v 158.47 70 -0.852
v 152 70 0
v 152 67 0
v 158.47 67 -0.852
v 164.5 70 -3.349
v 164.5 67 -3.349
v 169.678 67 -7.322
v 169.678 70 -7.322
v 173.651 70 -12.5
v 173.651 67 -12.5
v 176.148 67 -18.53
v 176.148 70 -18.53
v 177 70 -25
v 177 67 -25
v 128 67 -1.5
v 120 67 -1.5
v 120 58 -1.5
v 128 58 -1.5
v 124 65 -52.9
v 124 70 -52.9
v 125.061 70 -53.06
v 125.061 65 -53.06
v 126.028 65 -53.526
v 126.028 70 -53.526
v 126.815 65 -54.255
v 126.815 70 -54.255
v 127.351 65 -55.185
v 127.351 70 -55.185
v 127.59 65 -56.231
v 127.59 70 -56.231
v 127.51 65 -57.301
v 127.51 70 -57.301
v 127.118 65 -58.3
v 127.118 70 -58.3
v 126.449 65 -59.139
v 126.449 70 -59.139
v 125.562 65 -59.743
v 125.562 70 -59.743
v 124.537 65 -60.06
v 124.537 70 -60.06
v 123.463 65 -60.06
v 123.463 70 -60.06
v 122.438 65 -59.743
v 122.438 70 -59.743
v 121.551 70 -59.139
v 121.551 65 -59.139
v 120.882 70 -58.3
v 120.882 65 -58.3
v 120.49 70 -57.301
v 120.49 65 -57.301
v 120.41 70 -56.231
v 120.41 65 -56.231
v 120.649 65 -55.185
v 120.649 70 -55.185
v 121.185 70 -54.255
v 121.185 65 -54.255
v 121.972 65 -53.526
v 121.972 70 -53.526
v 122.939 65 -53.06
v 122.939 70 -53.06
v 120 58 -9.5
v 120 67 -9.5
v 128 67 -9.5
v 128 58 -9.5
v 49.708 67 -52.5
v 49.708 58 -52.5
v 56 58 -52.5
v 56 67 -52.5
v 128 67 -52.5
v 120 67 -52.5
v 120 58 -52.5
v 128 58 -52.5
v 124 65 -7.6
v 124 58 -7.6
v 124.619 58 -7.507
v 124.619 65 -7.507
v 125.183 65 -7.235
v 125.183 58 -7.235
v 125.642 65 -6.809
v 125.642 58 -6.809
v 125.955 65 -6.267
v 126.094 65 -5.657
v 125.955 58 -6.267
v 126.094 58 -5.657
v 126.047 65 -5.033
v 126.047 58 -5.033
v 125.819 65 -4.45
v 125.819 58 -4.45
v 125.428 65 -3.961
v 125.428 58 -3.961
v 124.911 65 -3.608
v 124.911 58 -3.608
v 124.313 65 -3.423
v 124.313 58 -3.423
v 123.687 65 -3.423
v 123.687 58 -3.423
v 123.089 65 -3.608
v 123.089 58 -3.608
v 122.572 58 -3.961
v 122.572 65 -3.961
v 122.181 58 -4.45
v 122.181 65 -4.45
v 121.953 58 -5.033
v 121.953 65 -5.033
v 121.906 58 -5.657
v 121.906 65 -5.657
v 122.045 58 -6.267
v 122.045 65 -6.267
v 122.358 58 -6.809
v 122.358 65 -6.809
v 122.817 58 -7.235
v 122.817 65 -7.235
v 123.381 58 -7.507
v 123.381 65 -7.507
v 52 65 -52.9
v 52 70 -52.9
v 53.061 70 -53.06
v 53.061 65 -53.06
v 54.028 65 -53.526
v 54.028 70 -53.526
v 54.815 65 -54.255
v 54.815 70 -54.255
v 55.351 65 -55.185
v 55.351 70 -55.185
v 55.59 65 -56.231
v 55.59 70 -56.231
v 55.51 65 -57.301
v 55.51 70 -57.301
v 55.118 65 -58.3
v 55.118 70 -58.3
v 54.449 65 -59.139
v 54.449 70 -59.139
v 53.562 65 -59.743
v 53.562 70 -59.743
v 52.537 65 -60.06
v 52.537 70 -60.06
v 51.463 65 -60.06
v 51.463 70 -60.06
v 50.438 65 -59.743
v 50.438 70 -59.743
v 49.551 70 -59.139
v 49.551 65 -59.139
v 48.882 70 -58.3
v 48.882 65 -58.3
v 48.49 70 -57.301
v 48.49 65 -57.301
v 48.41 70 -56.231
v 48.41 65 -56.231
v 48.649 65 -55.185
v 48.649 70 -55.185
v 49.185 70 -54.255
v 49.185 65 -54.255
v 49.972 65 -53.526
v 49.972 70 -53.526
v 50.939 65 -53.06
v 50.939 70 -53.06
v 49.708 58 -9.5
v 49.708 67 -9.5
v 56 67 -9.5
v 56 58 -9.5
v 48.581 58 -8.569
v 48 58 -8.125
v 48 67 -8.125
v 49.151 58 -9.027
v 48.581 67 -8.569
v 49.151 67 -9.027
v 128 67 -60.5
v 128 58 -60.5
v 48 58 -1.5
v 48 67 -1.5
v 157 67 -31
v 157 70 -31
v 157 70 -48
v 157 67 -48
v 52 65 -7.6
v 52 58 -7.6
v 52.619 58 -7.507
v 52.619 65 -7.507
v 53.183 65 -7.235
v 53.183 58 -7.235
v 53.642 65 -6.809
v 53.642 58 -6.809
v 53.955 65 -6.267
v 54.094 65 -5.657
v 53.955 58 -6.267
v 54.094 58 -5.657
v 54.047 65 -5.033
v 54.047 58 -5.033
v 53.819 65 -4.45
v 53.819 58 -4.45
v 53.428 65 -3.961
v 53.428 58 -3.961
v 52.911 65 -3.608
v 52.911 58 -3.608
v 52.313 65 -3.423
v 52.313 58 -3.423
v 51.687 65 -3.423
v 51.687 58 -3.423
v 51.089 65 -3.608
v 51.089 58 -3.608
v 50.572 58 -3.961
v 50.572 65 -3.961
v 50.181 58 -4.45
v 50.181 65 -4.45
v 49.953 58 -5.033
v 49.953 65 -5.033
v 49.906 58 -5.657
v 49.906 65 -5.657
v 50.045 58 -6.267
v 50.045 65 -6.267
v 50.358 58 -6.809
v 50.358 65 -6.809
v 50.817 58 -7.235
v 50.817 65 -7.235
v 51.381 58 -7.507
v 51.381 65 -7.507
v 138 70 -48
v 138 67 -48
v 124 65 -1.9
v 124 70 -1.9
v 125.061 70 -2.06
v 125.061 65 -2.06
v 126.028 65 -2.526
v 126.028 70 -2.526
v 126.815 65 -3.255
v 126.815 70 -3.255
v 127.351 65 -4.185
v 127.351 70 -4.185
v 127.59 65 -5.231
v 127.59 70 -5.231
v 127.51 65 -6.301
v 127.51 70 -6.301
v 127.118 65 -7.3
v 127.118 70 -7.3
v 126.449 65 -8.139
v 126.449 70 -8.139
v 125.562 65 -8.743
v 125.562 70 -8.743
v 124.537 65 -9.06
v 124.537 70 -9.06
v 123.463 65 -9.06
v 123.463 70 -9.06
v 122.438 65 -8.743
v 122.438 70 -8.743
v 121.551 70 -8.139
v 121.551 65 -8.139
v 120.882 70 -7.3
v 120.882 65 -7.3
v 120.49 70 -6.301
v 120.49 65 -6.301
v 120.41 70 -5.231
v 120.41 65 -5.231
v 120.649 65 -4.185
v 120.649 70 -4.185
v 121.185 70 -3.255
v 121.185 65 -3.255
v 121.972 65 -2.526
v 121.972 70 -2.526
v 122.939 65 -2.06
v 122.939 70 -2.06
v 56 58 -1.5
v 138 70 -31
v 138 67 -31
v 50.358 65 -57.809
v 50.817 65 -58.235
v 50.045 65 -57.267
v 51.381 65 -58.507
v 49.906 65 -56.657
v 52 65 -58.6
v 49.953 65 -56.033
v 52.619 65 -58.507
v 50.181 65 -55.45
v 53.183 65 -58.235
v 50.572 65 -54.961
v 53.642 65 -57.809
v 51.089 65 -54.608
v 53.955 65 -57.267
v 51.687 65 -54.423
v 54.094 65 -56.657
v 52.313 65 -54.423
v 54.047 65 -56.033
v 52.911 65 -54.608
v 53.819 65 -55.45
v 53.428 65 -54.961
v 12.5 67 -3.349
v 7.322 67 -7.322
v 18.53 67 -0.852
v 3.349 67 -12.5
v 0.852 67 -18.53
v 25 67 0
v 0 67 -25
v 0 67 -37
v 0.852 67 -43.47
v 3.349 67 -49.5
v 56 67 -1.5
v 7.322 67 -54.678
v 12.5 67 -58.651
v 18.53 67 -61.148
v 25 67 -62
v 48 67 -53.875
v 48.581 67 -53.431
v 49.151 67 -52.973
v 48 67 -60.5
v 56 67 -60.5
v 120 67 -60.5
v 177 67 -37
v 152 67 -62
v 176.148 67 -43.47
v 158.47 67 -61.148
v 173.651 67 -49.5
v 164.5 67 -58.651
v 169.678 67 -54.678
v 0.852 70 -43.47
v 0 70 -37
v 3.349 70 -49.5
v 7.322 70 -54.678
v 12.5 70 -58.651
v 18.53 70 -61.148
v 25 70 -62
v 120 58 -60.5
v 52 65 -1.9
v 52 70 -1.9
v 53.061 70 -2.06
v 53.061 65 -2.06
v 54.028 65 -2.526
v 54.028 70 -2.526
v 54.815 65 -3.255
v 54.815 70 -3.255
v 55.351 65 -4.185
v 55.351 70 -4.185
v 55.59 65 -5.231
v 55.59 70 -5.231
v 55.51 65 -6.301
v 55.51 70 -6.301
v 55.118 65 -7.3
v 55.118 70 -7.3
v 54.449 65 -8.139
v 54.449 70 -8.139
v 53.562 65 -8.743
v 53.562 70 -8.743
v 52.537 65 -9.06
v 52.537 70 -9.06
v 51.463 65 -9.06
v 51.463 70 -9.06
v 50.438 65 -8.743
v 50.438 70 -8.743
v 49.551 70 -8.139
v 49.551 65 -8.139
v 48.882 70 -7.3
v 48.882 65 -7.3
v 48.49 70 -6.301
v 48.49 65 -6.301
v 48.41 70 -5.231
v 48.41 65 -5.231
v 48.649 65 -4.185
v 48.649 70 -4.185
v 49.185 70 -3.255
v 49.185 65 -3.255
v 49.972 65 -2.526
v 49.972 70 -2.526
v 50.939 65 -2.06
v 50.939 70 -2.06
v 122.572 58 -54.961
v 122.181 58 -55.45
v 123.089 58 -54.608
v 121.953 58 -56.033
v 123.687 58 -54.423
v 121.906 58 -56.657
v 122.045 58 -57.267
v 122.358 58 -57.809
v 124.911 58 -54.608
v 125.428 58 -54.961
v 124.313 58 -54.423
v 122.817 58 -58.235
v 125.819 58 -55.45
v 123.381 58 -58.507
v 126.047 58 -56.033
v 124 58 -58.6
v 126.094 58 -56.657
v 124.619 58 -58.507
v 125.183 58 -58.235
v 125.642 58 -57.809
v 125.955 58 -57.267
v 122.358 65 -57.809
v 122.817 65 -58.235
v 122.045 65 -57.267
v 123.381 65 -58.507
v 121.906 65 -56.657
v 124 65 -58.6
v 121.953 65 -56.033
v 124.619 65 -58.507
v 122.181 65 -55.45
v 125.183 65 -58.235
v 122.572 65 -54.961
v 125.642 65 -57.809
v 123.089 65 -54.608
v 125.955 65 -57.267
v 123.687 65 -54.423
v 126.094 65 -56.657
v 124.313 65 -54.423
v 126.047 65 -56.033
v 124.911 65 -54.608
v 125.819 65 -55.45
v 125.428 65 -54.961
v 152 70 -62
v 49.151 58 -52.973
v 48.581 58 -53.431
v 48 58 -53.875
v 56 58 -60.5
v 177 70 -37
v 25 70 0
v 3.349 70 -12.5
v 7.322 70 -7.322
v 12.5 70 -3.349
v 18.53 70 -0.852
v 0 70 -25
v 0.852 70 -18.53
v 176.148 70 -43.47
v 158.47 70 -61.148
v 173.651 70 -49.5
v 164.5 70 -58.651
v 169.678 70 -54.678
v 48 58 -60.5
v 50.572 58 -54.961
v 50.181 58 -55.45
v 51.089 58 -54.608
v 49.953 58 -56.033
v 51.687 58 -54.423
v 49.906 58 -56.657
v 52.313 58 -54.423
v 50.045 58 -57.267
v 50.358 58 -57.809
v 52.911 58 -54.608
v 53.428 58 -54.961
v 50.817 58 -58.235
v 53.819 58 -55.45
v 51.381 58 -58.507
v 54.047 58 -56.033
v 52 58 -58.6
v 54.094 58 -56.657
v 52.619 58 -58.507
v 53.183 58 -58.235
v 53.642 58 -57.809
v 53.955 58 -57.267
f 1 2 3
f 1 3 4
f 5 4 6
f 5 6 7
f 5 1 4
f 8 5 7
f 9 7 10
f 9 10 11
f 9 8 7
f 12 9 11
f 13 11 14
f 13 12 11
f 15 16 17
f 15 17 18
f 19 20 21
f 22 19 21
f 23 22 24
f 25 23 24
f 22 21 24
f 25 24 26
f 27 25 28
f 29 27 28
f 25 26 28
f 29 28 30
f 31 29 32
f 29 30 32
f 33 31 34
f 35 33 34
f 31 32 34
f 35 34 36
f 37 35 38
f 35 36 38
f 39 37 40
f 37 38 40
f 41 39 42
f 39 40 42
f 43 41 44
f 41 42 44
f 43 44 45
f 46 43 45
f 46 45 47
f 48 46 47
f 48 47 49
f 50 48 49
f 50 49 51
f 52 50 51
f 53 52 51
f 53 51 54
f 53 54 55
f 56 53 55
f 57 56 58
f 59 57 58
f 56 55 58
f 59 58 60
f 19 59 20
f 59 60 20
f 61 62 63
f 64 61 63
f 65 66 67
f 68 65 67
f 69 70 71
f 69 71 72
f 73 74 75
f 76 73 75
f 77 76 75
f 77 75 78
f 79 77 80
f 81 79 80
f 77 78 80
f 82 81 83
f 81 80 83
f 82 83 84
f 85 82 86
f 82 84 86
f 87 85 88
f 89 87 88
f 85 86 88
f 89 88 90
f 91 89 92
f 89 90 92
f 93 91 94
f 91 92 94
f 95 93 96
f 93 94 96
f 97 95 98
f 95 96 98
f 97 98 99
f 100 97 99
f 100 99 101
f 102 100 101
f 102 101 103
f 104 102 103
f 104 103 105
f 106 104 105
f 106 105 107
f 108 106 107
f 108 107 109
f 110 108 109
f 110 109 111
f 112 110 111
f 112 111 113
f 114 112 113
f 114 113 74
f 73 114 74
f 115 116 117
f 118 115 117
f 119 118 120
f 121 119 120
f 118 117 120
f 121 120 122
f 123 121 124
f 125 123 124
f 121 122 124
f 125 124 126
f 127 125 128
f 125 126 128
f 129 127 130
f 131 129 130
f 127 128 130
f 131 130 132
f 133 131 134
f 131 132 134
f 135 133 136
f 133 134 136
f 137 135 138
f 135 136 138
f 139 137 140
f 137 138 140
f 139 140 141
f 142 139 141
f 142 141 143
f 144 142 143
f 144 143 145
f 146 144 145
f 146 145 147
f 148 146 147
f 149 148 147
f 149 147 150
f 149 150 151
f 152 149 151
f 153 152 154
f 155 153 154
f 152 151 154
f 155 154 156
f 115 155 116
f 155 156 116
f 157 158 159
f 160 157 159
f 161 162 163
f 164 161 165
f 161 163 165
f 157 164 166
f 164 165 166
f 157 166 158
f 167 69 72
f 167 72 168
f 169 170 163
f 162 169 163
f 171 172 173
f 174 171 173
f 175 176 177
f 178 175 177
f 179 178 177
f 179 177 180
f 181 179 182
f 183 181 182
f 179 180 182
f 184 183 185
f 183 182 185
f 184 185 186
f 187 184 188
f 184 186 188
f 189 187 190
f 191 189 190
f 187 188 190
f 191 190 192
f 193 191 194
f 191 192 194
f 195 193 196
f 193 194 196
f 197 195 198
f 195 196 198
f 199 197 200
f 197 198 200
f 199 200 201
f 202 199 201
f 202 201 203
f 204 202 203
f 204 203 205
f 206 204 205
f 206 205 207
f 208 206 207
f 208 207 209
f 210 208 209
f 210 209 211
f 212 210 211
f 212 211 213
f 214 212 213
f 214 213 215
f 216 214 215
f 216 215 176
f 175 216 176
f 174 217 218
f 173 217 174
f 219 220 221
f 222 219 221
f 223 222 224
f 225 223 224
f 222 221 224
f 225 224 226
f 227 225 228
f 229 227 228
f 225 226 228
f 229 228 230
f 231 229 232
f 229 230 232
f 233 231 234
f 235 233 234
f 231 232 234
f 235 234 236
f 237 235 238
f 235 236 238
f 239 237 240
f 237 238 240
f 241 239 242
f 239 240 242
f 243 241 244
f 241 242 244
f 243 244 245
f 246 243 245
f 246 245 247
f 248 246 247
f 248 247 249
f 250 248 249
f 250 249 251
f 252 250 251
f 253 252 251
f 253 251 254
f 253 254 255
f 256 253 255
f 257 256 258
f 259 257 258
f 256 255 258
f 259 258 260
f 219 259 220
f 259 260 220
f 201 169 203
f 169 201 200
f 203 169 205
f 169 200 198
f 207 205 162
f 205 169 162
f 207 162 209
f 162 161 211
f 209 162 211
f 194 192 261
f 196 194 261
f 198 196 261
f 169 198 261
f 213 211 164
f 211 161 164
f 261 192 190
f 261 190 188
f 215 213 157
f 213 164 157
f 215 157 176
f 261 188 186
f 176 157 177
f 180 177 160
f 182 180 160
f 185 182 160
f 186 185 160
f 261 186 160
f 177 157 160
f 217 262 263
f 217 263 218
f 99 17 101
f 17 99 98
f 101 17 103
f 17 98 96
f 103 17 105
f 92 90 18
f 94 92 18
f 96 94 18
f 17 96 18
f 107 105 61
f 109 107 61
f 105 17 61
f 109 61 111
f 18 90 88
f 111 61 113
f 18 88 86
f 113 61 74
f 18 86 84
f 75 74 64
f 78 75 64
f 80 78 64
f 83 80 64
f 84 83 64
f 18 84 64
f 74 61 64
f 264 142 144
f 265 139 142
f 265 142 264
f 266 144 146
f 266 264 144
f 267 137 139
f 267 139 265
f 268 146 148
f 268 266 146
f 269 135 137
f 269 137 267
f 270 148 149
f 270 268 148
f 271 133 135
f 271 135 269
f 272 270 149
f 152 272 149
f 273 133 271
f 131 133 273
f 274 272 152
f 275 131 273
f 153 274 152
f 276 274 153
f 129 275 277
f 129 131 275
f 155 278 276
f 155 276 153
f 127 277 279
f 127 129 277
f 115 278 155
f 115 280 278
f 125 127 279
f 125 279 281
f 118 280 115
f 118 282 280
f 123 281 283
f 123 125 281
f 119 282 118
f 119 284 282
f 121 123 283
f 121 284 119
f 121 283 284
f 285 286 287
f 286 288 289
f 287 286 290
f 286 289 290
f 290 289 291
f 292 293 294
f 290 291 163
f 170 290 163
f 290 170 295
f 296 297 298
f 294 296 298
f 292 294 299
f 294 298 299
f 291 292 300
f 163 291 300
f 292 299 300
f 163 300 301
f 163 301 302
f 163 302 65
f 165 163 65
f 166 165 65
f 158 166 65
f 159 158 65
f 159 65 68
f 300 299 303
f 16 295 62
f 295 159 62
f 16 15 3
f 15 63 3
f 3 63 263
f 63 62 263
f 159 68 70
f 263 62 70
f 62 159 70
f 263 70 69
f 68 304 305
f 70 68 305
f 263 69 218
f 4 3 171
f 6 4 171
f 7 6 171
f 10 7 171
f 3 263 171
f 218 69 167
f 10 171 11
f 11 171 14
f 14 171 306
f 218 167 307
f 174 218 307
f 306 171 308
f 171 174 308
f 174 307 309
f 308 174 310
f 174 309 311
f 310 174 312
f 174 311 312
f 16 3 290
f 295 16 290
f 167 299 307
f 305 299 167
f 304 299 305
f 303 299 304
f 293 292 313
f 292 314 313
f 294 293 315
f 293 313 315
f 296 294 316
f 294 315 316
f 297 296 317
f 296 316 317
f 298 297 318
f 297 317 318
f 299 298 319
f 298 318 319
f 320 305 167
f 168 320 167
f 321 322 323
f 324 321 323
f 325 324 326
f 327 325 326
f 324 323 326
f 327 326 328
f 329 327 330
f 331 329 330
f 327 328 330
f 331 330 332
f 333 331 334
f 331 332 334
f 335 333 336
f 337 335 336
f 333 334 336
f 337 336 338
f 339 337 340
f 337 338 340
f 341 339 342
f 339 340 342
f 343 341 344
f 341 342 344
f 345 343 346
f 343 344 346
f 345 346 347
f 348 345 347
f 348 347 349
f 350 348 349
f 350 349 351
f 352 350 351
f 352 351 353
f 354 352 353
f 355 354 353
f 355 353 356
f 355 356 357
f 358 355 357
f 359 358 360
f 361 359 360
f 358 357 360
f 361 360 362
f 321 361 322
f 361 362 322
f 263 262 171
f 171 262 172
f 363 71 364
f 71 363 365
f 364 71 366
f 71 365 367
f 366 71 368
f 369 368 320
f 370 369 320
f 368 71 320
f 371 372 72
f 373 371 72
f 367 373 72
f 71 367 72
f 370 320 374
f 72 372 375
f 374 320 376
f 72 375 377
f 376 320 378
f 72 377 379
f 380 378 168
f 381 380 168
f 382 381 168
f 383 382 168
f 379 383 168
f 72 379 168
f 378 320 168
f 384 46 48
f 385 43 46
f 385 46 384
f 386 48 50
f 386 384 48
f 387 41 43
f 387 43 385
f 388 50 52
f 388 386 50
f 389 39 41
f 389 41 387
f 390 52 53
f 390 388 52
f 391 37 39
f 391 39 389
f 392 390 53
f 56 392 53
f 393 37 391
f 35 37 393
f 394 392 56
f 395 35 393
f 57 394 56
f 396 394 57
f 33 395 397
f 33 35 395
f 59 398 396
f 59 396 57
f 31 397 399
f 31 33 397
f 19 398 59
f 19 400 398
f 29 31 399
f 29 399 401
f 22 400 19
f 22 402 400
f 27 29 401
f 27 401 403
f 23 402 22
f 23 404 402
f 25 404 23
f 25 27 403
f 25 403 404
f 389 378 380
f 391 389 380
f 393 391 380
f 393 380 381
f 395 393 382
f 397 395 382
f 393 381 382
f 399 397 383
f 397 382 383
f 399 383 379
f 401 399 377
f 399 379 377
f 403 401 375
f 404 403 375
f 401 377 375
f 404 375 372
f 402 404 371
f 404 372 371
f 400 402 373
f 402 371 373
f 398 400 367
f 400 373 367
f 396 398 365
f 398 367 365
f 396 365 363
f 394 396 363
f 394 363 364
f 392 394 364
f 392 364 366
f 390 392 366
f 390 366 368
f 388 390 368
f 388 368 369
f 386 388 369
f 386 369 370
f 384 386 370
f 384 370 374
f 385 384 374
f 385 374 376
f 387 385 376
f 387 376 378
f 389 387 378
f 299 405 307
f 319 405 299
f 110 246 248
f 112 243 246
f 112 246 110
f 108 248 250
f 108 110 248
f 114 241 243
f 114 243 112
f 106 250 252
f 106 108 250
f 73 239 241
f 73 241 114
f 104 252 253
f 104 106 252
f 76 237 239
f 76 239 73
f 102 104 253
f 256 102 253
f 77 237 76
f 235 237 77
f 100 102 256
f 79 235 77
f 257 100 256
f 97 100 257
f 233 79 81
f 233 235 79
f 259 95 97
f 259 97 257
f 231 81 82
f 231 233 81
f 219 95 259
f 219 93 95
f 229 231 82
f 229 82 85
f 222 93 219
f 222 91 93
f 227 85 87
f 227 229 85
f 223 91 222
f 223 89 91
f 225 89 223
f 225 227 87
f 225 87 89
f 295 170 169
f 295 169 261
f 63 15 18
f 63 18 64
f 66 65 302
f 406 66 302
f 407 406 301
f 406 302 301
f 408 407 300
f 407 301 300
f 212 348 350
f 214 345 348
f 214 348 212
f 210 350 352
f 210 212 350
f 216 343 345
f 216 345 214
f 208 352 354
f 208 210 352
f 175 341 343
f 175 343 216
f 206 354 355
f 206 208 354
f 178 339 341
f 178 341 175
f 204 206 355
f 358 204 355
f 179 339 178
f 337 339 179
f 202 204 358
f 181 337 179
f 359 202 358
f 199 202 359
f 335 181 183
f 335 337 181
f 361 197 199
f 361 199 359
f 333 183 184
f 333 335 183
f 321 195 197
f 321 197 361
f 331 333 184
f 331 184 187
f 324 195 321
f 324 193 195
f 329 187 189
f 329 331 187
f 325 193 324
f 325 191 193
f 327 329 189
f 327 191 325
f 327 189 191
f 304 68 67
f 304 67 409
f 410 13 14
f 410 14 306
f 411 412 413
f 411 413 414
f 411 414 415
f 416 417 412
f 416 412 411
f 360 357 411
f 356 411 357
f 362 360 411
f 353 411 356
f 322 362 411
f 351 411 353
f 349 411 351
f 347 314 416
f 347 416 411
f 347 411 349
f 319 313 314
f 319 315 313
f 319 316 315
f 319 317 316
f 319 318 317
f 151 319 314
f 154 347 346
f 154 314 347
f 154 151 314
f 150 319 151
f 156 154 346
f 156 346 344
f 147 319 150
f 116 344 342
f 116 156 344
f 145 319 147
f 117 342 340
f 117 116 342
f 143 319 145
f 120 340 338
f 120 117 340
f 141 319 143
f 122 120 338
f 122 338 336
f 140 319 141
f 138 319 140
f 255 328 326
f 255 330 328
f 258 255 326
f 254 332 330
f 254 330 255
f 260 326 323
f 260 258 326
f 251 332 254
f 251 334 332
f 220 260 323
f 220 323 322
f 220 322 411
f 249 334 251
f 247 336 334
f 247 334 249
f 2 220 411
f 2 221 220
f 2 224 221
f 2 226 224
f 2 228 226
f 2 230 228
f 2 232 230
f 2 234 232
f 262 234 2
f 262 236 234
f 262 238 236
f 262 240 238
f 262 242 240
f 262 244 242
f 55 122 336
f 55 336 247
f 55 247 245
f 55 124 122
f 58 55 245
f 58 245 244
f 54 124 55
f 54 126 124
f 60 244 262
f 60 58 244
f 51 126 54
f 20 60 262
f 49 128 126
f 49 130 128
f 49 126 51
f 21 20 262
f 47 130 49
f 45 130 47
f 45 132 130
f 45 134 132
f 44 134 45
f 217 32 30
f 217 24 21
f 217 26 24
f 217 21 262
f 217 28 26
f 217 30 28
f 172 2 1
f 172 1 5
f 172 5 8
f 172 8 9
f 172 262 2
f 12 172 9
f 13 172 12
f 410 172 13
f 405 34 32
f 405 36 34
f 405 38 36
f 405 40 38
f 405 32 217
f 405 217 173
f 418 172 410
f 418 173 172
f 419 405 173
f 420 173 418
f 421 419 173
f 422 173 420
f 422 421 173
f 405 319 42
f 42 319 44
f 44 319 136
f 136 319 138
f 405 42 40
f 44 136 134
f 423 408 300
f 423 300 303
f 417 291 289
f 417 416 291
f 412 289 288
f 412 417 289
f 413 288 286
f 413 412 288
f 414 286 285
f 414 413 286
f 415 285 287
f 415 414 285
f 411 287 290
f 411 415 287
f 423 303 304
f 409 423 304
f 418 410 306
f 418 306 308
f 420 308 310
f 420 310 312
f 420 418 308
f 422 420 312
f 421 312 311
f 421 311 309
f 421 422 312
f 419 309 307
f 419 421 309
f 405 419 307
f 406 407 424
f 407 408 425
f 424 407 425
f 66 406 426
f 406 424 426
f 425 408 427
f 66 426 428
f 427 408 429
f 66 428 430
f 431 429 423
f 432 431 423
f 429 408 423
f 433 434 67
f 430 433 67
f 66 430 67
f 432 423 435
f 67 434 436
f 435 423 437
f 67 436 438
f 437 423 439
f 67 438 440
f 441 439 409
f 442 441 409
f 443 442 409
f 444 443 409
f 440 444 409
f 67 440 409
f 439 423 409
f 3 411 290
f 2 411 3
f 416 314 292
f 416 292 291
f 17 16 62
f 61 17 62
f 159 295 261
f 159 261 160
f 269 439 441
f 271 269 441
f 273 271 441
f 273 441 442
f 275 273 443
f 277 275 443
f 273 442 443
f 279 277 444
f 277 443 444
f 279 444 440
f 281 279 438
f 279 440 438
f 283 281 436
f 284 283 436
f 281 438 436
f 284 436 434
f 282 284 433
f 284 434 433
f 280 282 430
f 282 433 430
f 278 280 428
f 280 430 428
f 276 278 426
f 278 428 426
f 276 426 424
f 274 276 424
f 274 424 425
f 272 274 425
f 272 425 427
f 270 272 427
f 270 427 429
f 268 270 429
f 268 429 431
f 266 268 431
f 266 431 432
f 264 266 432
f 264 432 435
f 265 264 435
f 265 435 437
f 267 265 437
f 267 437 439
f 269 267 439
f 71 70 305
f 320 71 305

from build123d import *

# Parameters (mm, degrees)
SKETCH1_W                = 177
SKETCH1_H                = 62
BOSS_EXTRUDE1_DEPTH      = 70
FILLET1_R                = 25
SKETCH3_W                = 19
SKETCH3_H                = 17
CUT_EXTRUDE1_DEPTH       = 70
CUT_EXTRUDE5_DEPTH       = 64
BOSS_EXTRUDE7_DEPTH      = 33
SKETCH16_W               = 5
SKETCH16_H               = 5
BOSS_EXTRUDE8_DEPTH      = 40
SKETCH11_R               = 25
CUT_EXTRUDE9_DEPTH       = 5.5
SKETCH22_R               = 28.5
BOSS_EXTRUDE20_DEPTH     = 21
BOSS_EXTRUDE21_DEPTH     = 10
BOSS_EXTRUDE22_DEPTH     = 40
SKETCH26_R               = 25
SKETCH26_W               = 19
SKETCH26_H               = 17
BOSS_EXTRUDE23_DEPTH     = 1
SKETCH27_W               = 40
SKETCH27_H               = 10
CUT_EXTRUDE12_DEPTH      = 10
SKETCH28_W               = 10
SKETCH28_H               = 10
CUT_EXTRUDE13_DEPTH      = 5
SKETCH30_W               = 194.337314874
SKETCH30_H               = 68.122542634
CUT_EXTRUDE14_DEPTH      = 0.1
CUT_EXTRUDE17_DEPTH      = 58
CUT_EXTRUDE17_DEPTH_BACK = 45
SKETCH26_3_R             = 25
SKETCH26_3_W             = 19
SKETCH26_3_H             = 17
CUT_EXTRUDE25_START      = -21.9
CUT_EXTRUDE25_DEPTH      = 21.9
SKETCH38_W               = 8
SKETCH38_H               = 8
BOSS_EXTRUDE26_DEPTH     = 12
SKETCH41_R               = 3.6
CUT_EXTRUDE28_DEPTH      = 5
SKETCH44_R               = 2.1
CUT_EXTRUDE29_DEPTH      = 8
CUT_EXTRUDE30_START      = -3
SKETCH22_2_R             = 28.5
CUT_EXTRUDE30_DEPTH      = 40
SKETCH45_W               = 19.955287375
SKETCH45_H               = 24.166036088
CUT_EXTRUDE31_DEPTH      = 112


with BuildPart() as part:
    # Sketch1 → Boss-Extrude1 (new body)
    with BuildSketch(Plane(origin=(0, 0, 0), x_dir=(1, 0, 0), z_dir=(0, 1, 0))):
        with Locations((88.5, 31)):
            Rectangle(SKETCH1_W, SKETCH1_H)
    extrude(amount=BOSS_EXTRUDE1_DEPTH)

    # Fillet1
    fillet1_edges = [part.edges().sort_by_distance(p)[0] for p in [
        (0, 35, -62),
        (177, 35, -62),
        (177, 35, 0),
        (0, 35, 0),
    ]]
    fillet(fillet1_edges, radius=FILLET1_R)

    # Sketch3 → Cut-Extrude1 (cut)
    with BuildSketch(Plane(origin=(0, 70, 0), x_dir=(1, 0, 0), z_dir=(0, 1, 0))):
        with Locations((147.5, 39.5)):
            Rectangle(SKETCH3_W, SKETCH3_H)
    extrude(amount=-CUT_EXTRUDE1_DEPTH, mode=Mode.SUBTRACT)

    # Sketch9 → Cut-Extrude5 (cut)
    with BuildSketch(Plane(origin=(0, 67, 0), x_dir=(1, 0, 0), z_dir=(0, 1, 0))):
        with BuildLine():
            Line((25, 59), (152, 59))
            ThreePointArc((152, 59), (167.556349186, 52.556349186), (174, 37))
            Line((174, 37), (174, 25))
            ThreePointArc((174, 25), (167.556349186, 9.443650814), (152, 3))
            Line((152, 3), (25, 3))
            ThreePointArc((25, 3), (9.443650814, 9.443650814), (3, 25))
            Line((3, 25), (3, 37))
            ThreePointArc((3, 37), (9.443650814, 52.556349186), (25, 59))
        make_face()
    extrude(amount=-CUT_EXTRUDE5_DEPTH, mode=Mode.SUBTRACT)

    # Sketch15 → Boss-Extrude7 (add)
    with BuildSketch(Plane.XZ):
        Polygon((125, -7), (121, -3), (119, -3), (119, -7.5), (125, -7.5), align=None)
        Polygon((137, -7), (137, -7.5), (143, -7.5), (143, -3), (141, -3), align=None)
    extrude(amount=-BOSS_EXTRUDE7_DEPTH)

    # Sketch16 → Boss-Extrude8 (add)
    with BuildSketch(Plane.XZ):
        with Locations((58.5, -5.5)):
            Rectangle(SKETCH16_W, SKETCH16_H)
        Polygon((61, -40.5), (61, -44), (101, -44), (101, -40.5), (106, -40.5), (106, -59), (56, -59), (56, -40.5), align=None)
        with Locations((104.5, -5.5)):
            Rectangle(SKETCH16_W, SKETCH16_H)
    extrude(amount=-BOSS_EXTRUDE8_DEPTH)

    # Sketch11 → Cut-Extrude9 (cut)
    with BuildSketch(Plane.XZ):
        with Locations(Location((31, -31, 0), (0, 0, 270))):
            Circle(SKETCH11_R)
    extrude(amount=-CUT_EXTRUDE9_DEPTH, mode=Mode.SUBTRACT)

    # Sketch22 → Boss-Extrude20 (add)
    with BuildSketch(Plane(origin=(0, 70, 0), x_dir=(1, 0, 0), z_dir=(0, 1, 0))):
        with Locations((31, 31)):
            Circle(SKETCH22_R)
    extrude(amount=-BOSS_EXTRUDE20_DEPTH)

    # Sketch24 → Boss-Extrude21 (add)
    with BuildSketch(Plane.XZ):
        Polygon((123.5, -7.5), (125, -7.5), (125, -29.5), (137, -29.5), (137, -7.5), (138.5, -7.5), (138.5, -35.5), (123.5, -35.5), align=None)
    extrude(amount=-BOSS_EXTRUDE21_DEPTH)

    # Sketch25 → Boss-Extrude22 (add)
    with BuildSketch(Plane.XZ):
        Polygon((134.5, -35.5), (134.5, -31.5), (124.5, -31.5), (124.5, -45.5), (128.5, -45.5), (128.5, -35.5), align=None)
        Polygon((160.5, -35.5), (166.5, -35.5), (166.5, -45.5), (170.5, -45.5), (170.5, -31.5), (160.5, -31.5), align=None)
    extrude(amount=-BOSS_EXTRUDE22_DEPTH)

    # Sketch26 → Boss-Extrude23 (add)
    with BuildSketch(Plane.XZ):
        with BuildLine():
            Line((25, 0), (152, 0))
            ThreePointArc((152, 0), (169.67766953, -7.32233047), (177, -25))
            Line((177, -25), (177, -37))
            ThreePointArc((177, -37), (169.67766953, -54.67766953), (152, -62))
            Line((152, -62), (25, -62))
            ThreePointArc((25, -62), (7.32233047, -54.67766953), (0, -37))
            Line((0, -37), (0, -25))
            ThreePointArc((0, -25), (7.32233047, -7.32233047), (25, 0))
        make_face()
        with Locations(Location((31, -31, 0), (0, 0, 270))):
            Circle(SKETCH26_R, mode=Mode.SUBTRACT)
        with Locations((147.5, -39.5)):
            Rectangle(SKETCH26_W, SKETCH26_H, mode=Mode.SUBTRACT)
    extrude(amount=BOSS_EXTRUDE23_DEPTH)

    # Sketch27 → Cut-Extrude12 (cut)
    with BuildSketch(Plane.ZY):
        with Locations((-31, 34.5)):
            Rectangle(SKETCH27_W, SKETCH27_H)
    extrude(amount=-CUT_EXTRUDE12_DEPTH, mode=Mode.SUBTRACT)

    # Sketch28 → Cut-Extrude13 (cut)
    with BuildSketch(Plane.XZ.offset(1)):
        with Locations((115, -54)):
            Rectangle(SKETCH28_W, SKETCH28_H)
    extrude(amount=-CUT_EXTRUDE13_DEPTH, mode=Mode.SUBTRACT)

    # Sketch30 → Cut-Extrude14 (cut)
    with BuildSketch(Plane(origin=(0, 67, 0), x_dir=(1, 0, 0), z_dir=(0, 1, 0))):
        with Locations((88.376869027, 31.076383763)):
            Rectangle(SKETCH30_W, SKETCH30_H)
        with BuildLine():
            Line((25, 58), (152, 58))
            ThreePointArc((152, 58), (166.849242405, 51.849242405), (173, 37))
            Line((173, 37), (173, 25))
            ThreePointArc((173, 25), (166.849242405, 10.150757595), (152, 4))
            Line((152, 4), (25, 4))
            ThreePointArc((25, 4), (10.150757595, 10.150757595), (4, 25))
            Line((4, 25), (4, 37))
            ThreePointArc((4, 37), (10.150757595, 51.849242405), (25, 58))
        make_face(mode=Mode.SUBTRACT)
    extrude(amount=-CUT_EXTRUDE14_DEPTH, mode=Mode.SUBTRACT)

    # Sketch26<3> → Cut-Extrude17 (cut, two sides: drawn at the far end of the back side and taken through both)
    with BuildSketch(Plane.XZ.offset(-CUT_EXTRUDE17_DEPTH_BACK)):
        with BuildLine():
            Line((25, 0), (152, 0))
            ThreePointArc((152, 0), (169.67766953, -7.32233047), (177, -25))
            Line((177, -25), (177, -37))
            ThreePointArc((177, -37), (169.67766953, -54.67766953), (152, -62))
            Line((152, -62), (25, -62))
            ThreePointArc((25, -62), (7.32233047, -54.67766953), (0, -37))
            Line((0, -37), (0, -25))
            ThreePointArc((0, -25), (7.32233047, -7.32233047), (25, 0))
        make_face()
        with Locations((31, -31)):
            Circle(SKETCH26_3_R, mode=Mode.SUBTRACT)
        with Locations((147.5, -39.5)):
            Rectangle(SKETCH26_3_W, SKETCH26_3_H, mode=Mode.SUBTRACT)
    extrude(amount=CUT_EXTRUDE17_DEPTH + CUT_EXTRUDE17_DEPTH_BACK, mode=Mode.SUBTRACT)


with BuildPart() as cut_extrude17_piece_1:
    # of the separate pieces the step leaves, piece 1, a body of its own (cut_extrude17_pieces)
    add(part.part.solids().sort_by_distance((25, 70, 0))[0])

    # Sketch36 → Cut-Extrude25 (cut)
    with BuildSketch(Plane.XZ.offset(-45).offset(CUT_EXTRUDE25_START)):
        with BuildLine():
            Line((152, 0), (25, 0))
            ThreePointArc((25, 0), (7.32233047, -7.32233047), (0, -25))
            Line((0, -25), (0, -37))
            ThreePointArc((0, -37), (7.32233047, -54.67766953), (25, -62))
            Line((25, -62), (152, -62))
            ThreePointArc((152, -62), (169.67766953, -54.67766953), (177, -37))
            Line((177, -37), (177, -25))
            ThreePointArc((177, -25), (169.67766953, -7.32233047), (152, 0))
        make_face()
        with BuildLine():
            ThreePointArc((3, -25), (9.443650814, -9.443650814), (25, -3))
            Line((25, -3), (152, -3))
            ThreePointArc((152, -3), (167.556349186, -9.443650814), (174, -25))
            Line((174, -25), (174, -37))
            ThreePointArc((174, -37), (167.556349186, -52.556349186), (152, -59))
            Line((152, -59), (25.684927094, -59))
            ThreePointArc((25.684927094, -59), (9.884563828, -52.596687732), (3, -37))
            Line((3, -37), (3, -25))
        make_face(mode=Mode.SUBTRACT)
    extrude(amount=CUT_EXTRUDE25_DEPTH, mode=Mode.SUBTRACT)

    # Sketch38 → Boss-Extrude26 (add)
    with BuildSketch(Plane(origin=(0, 70, 0), x_dir=(1, 0, 0), z_dir=(0, 1, 0))):
        with Locations((52, 56.5)):
            Rectangle(SKETCH38_W, SKETCH38_H)
        with Locations((124, 56.5)):
            Rectangle(SKETCH38_W, SKETCH38_H)
        with Locations((52, 5.5)):
            Rectangle(SKETCH38_W, SKETCH38_H)
        with Locations((124, 5.5)):
            Rectangle(SKETCH38_W, SKETCH38_H)
    extrude(amount=-BOSS_EXTRUDE26_DEPTH)

    # Sketch41 → Cut-Extrude28 (cut)
    with BuildSketch(Plane(origin=(0, 70, 0), x_dir=(1, 0, 0), z_dir=(0, 1, 0))):
        with Locations(Location((52, 56.5, 0), (0, 0, 270))):
            Circle(SKETCH41_R)
        with Locations(Location((124, 56.5, 0), (0, 0, 270))):
            Circle(SKETCH41_R)
        with Locations(Location((52, 5.5, 0), (0, 0, 270))):
            Circle(SKETCH41_R)
        with Locations(Location((124, 5.5, 0), (0, 0, 270))):
            Circle(SKETCH41_R)
    extrude(amount=-CUT_EXTRUDE28_DEPTH, mode=Mode.SUBTRACT)

    # Sketch44 → Cut-Extrude29 (cut)
    with BuildSketch(Plane.XZ.offset(-58)):
        with Locations(Location((52, -5.5, 0), (0, 0, 270))):
            Circle(SKETCH44_R)
        with Locations(Location((124, -56.5, 0), (0, 0, 270))):
            Circle(SKETCH44_R)
        with Locations(Location((52, -56.5, 0), (0, 0, 270))):
            Circle(SKETCH44_R)
        with Locations(Location((124, -5.5, 0), (0, 0, 270))):
            Circle(SKETCH44_R)
    extrude(amount=-CUT_EXTRUDE29_DEPTH, mode=Mode.SUBTRACT)

    # Sketch22<2> → Cut-Extrude30 (cut)
    with BuildSketch(Plane(origin=(0, 70, 0), x_dir=(1, 0, 0), z_dir=(0, 1, 0)).offset(CUT_EXTRUDE30_START)):
        with Locations((31, 31)):
            Circle(SKETCH22_2_R)
    extrude(amount=-CUT_EXTRUDE30_DEPTH, mode=Mode.SUBTRACT)


with BuildPart() as cut_extrude17_piece_2:
    # of the separate pieces the step leaves, piece 2, a body of its own (cut_extrude17_pieces)
    add(part.part.solids().sort_by_distance((138.5, 0, -35.5))[0])

    # Sketch45 → Cut-Extrude31 (cut)
    with BuildSketch(Plane.XZ.offset(-67)):
        with Locations((142.415891121, -34.661520619)):
            Rectangle(SKETCH45_W, SKETCH45_H)
    extrude(amount=CUT_EXTRUDE31_DEPTH, mode=Mode.SUBTRACT)


solid = cut_extrude17_piece_1.part
